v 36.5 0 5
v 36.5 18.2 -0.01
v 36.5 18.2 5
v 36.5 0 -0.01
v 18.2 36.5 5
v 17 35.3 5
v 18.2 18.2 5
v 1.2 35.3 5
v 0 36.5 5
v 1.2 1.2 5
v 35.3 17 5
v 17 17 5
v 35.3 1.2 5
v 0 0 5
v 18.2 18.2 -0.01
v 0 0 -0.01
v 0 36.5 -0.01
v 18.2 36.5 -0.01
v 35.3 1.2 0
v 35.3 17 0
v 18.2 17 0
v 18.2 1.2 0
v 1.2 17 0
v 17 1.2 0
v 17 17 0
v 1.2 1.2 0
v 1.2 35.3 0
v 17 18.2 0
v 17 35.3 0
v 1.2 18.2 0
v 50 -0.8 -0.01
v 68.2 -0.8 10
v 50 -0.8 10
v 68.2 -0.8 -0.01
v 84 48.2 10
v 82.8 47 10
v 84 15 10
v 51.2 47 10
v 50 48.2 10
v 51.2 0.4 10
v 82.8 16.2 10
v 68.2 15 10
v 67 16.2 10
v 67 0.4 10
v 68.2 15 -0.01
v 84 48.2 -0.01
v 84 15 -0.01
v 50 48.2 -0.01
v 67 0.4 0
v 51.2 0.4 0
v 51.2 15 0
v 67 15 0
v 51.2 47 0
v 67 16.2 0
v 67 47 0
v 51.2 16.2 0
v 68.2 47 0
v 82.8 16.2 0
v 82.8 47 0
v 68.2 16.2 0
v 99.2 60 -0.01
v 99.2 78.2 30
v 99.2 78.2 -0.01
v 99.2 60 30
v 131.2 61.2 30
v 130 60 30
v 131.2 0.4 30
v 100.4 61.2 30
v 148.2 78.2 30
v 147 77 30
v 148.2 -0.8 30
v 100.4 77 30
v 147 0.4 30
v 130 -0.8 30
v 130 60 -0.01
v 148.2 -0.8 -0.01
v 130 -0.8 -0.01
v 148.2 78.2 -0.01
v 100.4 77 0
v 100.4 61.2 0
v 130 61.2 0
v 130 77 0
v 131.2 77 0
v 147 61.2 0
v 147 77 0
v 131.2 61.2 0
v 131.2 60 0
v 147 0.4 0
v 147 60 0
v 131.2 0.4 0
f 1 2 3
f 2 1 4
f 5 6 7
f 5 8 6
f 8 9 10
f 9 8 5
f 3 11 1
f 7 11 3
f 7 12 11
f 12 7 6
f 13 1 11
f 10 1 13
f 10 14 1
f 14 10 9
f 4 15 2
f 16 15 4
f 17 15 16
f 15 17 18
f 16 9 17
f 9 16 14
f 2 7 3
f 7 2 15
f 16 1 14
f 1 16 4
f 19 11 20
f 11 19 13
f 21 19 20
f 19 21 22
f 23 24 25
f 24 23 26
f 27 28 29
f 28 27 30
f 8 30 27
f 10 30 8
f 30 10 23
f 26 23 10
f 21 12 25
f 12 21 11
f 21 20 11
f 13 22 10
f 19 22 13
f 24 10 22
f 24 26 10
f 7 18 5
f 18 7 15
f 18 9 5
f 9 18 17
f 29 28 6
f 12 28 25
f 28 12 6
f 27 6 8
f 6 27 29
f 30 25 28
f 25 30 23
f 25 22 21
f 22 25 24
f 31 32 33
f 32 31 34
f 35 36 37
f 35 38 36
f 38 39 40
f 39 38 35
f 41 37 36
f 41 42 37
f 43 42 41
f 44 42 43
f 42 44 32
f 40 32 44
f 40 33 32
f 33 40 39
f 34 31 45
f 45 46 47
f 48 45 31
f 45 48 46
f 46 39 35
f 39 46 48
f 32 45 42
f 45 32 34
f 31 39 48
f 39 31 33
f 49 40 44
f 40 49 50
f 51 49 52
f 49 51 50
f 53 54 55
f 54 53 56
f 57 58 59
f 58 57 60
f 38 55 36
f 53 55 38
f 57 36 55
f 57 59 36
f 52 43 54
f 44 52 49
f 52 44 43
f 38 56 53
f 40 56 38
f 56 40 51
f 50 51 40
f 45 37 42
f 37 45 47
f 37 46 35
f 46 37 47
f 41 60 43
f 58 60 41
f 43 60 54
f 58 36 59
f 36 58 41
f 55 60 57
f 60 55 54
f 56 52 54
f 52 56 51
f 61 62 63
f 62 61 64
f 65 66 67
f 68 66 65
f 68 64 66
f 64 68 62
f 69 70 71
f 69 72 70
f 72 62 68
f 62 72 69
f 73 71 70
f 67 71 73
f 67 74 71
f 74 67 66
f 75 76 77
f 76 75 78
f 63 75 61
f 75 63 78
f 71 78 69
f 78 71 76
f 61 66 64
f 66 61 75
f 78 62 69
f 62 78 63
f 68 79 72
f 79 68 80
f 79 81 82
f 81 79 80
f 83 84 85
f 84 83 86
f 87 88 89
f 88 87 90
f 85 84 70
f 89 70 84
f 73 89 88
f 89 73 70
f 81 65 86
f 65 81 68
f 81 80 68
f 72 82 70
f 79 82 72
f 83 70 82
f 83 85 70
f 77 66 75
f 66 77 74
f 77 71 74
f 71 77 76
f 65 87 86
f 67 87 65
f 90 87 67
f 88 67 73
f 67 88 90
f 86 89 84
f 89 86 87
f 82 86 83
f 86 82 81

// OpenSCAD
// file: ../../Base/Boxes.scad
// Fischertechnik Box Foundation
// Pre-designed Boxes

use <Constants.scad>

include <PlacementOptions.scad>

box190Width = 190;
box190Depth = 130;
box130Width = 130;
box130Depth = 95;
boxUsageHeight = 33.9;
boxWallThickness = 2.4;
boxBaseThickness = 1.0;

// getBoxWallThickness()
// Gets the wall thickness of a Fischertechnik Box

function getBoxWallThickness() = boxWallThickness;

// Gets the usable height of a fischertechnik box
function getBoxUsageHeight() = boxUsageHeight;

// Gets the thickness of the Fischertechnik box base.
function getBoxBaseThickness() = boxBaseThickness;

// Gets the usable inner space of a Box 190 as an x/y-list
function getBox190Space() = [
    box190Width - 2*getBoxWallThickness(), 
    box190Depth - 2*getBoxWallThickness() ];

// Imports the Fischertechnik empty box 130x190 mm and places it at position 0,0
// 190x130 are the outer sizes, the inner space is slightly smaller. Use getBox190Space() to get the inner sizes.
// This module needs the STL file "Fischertechnik Box 130x190.stl" in the library path.
// The box is positioned that the usable inner space is at the 0,0,0 position. The

module Box190() {
    translate([-getBoxWallThickness(),-getBoxWallThickness(),-getBoxBaseThickness()])
        import("Fischertechnik Box 130x190.stl", convexity=3);
}

// Gets the usable inner space of a Box 130 as an x/y-list
function getBox130Space() = [
    box130Width - 2*getBoxWallThickness(), 
    box130Depth - 2*getBoxWallThickness() ];

// Imports the Fischertechnik empty box 95x130 mm and places it at position 0,0
// 190x130 are the outer sizes, the inner space is slightly smaller. Use getBox190Space() to get the inner sizes.
// This module needs the STL file "Fischertechnik Box 95x130.stl" in the library path.
// The box is positioned that the usable inner space is at the 0,0,0 position. The

module Box130() {
    translate([-getBoxWallThickness(),-getBoxWallThickness(),-getBoxBaseThickness()])
        import("Fischertechnik Box 95x130.stl", convexity=3);
}

// Creates a web at the specified box walls
// corner 0 = LowerLeft, 1 = UpperLeft, 2 = UpperRight, 3 = LowerRight
// side 0 = LeftOfCorner, 1 = RightOfCorner
// distance = Distance in mm from the corner
// box = inner width and depth of the box (default: Box 190)
// webWidth = length of the web (default is 3 mms)
// webThickness = thickness of the web (default is 1 mm)

module BoxWeb(corner, side, distance, box=getBox190Space(), webWidth=3, webThickness=1.0) {
    sink = getBoxWallThickness()/2;

    width = (corner % 2 == 0) ? 
            (side == LeftOfCorner ? webWidth : webThickness) :
            (side == LeftOfCorner ? webThickness : webWidth);

    depth = (corner % 2 == 0) ? 
            (side == RightOfCorner ? webWidth : webThickness) :
            (side == RightOfCorner ? webThickness : webWidth);
    
    xDiff = corner == LowerLeft ? 
                (side == LeftOfCorner ? -sink : distance) :
            (corner == UpperLeft ?                
                (side == LeftOfCorner ? distance : -sink) :
            (corner == UpperRight ?
                (side == LeftOfCorner ? box.x-webWidth+sink : box.x-distance-webThickness) :
                (side == LeftOfCorner ? box.x-distance-webThickness: box.x-webWidth+sink)));

    yDiff = corner == LowerLeft ? 
                (side == RightOfCorner ? -sink : distance) :
            (corner == UpperLeft ?
                (side == RightOfCorner ? box.y-distance : box.y-webWidth+sink) :
            (corner == UpperRight ?
                (side == RightOfCorner ? box.y-webWidth+sink : box.y-distance) :
                (side == RightOfCorner ? distance : -sink)));
    
    translate([xDiff, yDiff, -getExcess()])
        cube([width, depth, boxUsageHeight + 2*getExcess()]);
}
// file: ../../Base/Rotation.scad
// Fischertechnik Box Foundation
// Geometry Helpers Rotation

include <PlacementOptions.scad>

// getRotatedSpace(space, rotation=NoRotation)
// Rotates the space dependent on the specified rotation

function getRotatedSpace(space, rotation=NoRotation) = [
    (rotation == Rotate90 || rotation == Rotate270) ? space.y : space.x,
    (rotation == Rotate90 || rotation == Rotate270) ? space.x : space.y
];

// Rotates the given space around the fixed left lower corner
// space = the space the children needs as width/depth list [width,depth]
// rotation = 0 Rotate0 degrees, 1 Rotate90 degrees, 2 Rotate180 degrees, 3 Rotate270 degrees (equivalent to -90)

module RotateFix(space, rotation=Rotate0) {
    dy = (rotation == Rotate0 || rotation == Rotate270) ? 0 :
        (rotation == Rotate90) ? space.x :
        space.y;
    dx = (rotation < Rotate180) ? 0 :
        (rotation == Rotate180) ? space.x :
        space.y;
    
    translate([dx, dy, 0])
        rotate([0, 0, rotations[rotation]])
            children();
}
// file: ../../Base/Alignment.scad
// Fischertechnik Box Foundation
// Geometry Helpers Alignment

include <PlacementOptions.scad>

// getAlignedX(elementWidth, spaceWidth, align=AlignRight, offset=0)
// Gets the aligned X offset of an element with the given
// width in the given space.
// elementWidth = The width of the element to positon
// spaceWidth = The space where the element should be aligned
// align = 0 AlignLeft, 1 AlignCenter, 2 AlignRight
// offset = an optional offset from the aligned position. When
// aligned left or centered, then positive values are in X direction.
// When aligned right then positive values are in negative X direction.

function getAlignedX(elementWidth, spaceWidth, align=AlignRight, offset=0) =
    (align == AlignLeft) ?
        offset :
        ((align == AlignCenter) ?
        (spaceWidth - elementWidth)/2 + offset :
        spaceWidth - offset - elementWidth);

// getAlignedY(elementDepth, spaceDepth, align=AlignTop, offset=0)
// Gets the aligned Y offset of an element with the given
// depth in the given space.
// elementDepth = The depth of the element to positon
// spaceDepth = The space where the element should be aligned
// align = 0 AlignBottom, 1 AlignCenter, 2 AlignTop
// offset = an optional offset from the aligned position. When
// aligned bottom or centered, then positive values are in Y direction.
// When aligned top then positive values are in negative Y direction.

function getAlignedY(elementDepth, spaceDepth, align=AlignTop, offset=0) =
    (align == AlignBottom) ?
        offset :
        ((align == AlignCenter) ?
        (spaceDepth - elementDepth)/2 + offset :
        spaceDepth - offset - elementDepth);
// file: ../../Base/Constants.scad
// Fischertechnik Box Foundation
// Constants

// Constant values necessary for multiple elements

// Base constants
dividerThickness = 1.2;
excess = 0.01;
fragments = 90;
tolerance = 0.8;

// Gets the thickness of a divider 
function getDividerThickness() = dividerThickness;

// Gets the excess that is used to merge walls into each other
function getExcess() = excess;

// Gets amount of fragments of a cylinder
function getFragments() = fragments;

// Gets the inner tolerance of a frame to each side
function getTolerance() = tolerance;


// Fischertechnik specific constants
axisDiameter = 4;
axisBottomDiameter = axisDiameter + 1;
standardEdgeDistance = 2.5;
standardWebDistance = 11.5;
standardCornerLength = 15;
tubeWallFactor = 1.6;

// Gets axis diameter
function getAxisDiameter() = axisDiameter;

// Gets axis bottom diameter for thicker part at the bottom
function getAxisBottomDiameter() = axisBottomDiameter;

// gets the standard distance to the wall of the box for dockable frames with webs
function getStandardEdgeDistance() = standardEdgeDistance;

// gets the standard distance of each web to the corner of the dockable frame
function getStandardWebDistance() = standardWebDistance;

// gets the standard length of the corner walls of a dockable frame
function getStandardCornerLength() = standardCornerLength;

// gets the wall thickness of a tube.
function getTubeWallThickness() = tubeWallFactor * getDividerThickness();
// file: ../../Base/PlacementOptions.scad
// Fischertechnik Box Foundation
// Placement Options

// Alignment
NoAlign = 0;
AlignLeft = 1;
AlignBottom = 2;
AlignCenter = 3;
AlignRight = 4;
AlignTop = 5;

// Element rotation degree steps
rotations = [0, -90, -180, -270];

// Rotation
NoRotation = 0;
Rotate0 = 0;
Rotate90 = 1;
Rotate180 = 2;
Rotate270 = 3;

// Docking (seen from above)
NoDock = -1;
DockLeft = 0;
DockTop = 1;
DockRight = 2;
DockCorner = 2;
DockBottom = 3;

// Web corners
LowerLeft = 0;
UpperLeft = 1;
UpperRight = 2;
LowerRight = 3;

// Web position relative to corner
LeftOfCorner = 0;
RightOfCorner = 1;
// file: ../../Base/Placement.scad
// Fischertechnik Box Foundation
// Geometry Helpers Placement

use <Constants.scad>
use <Alignment.scad>
use <Rotation.scad>
use <Boxes.scad>

include <PlacementOptions.scad>

// Place(x=0, y=0, elementSpace=[0,0], alignX=AlignLeft, alignY=AlignBottom, rotation=Rotate0, boxSpace=getBox190Space())
// Places the child at the specified position
// y = Y-Position. This is a relative position when an X aligment is specified.
// x = X-Position. This is a relative position when an Y aligment is specified.
// elementSpace = space of the element to be placed [x,y]
// alignX = -1=NoAlign, 0 AlignLeft, 1 AlignCenter, 3 AlignRight (elementSpace and boxSpace required!)
// alignY = -1=NoAlign, 2 AlignBottom, 1 AlignCenter, 4 AlignTop (elementSpace and boxSpace required!)
// rotation = 0 Rotate0 0 degrees, 1 Rotate90 90 degrees, 
// 2 Rotate180 180 degrees, 3 Rotate270 270 degrees (equivalent to -90)
// boxSpace = Inner space of the box where the placement occurs [x,y] - default is Box 190x130 inner space

module Place(x=0, y=0, elementSpace=[0,0], 
  alignX=AlignLeft, alignY=AlignBottom, 
  rotation=NoRotation, boxSpace=getBox190Space()) {

    module Position(x, y, space, rotation=Rotate0) {
        translate([x, y, 0])
            RotateFix(space, rotation)
                children(0);
    }

    space = getRotatedSpace(elementSpace, rotation);
    alignedX = getAlignedX(space.x, boxSpace.x, alignX, x);
    alignedY = getAlignedY(space.y, boxSpace.y, alignY, y);
    Position(alignedX, alignedY, elementSpace, rotation)
        children(0);
}

// Center(space=getBox130Space(), elementSpace=[0,0])
// space = Space where the children is centered. For cylinder use centered=true and no elementSpace.
// elementSpace = space of the element to be centered [x,y]

module Center(space=getBox190Space(), elementSpace=[0,0]) {
    translate([(space.x - elementSpace.x) / 2, (space.y - elementSpace.y) / 2])
        children(0);
}

// CenterHorizontal(width=0, y=0, offset=0, space=getBox130Space())
// space = Space where the children is centered. For cylinder use centered=true and no elementSpace.
// elementSpace = space of the element to be centered [x,y]

module CenterHorizontal(width=0, y=0, offset=0, space=getBox190Space()) {
    translate([(space.x - width) / 2 + offset, y])
        children(0);
}

// CenterVertical(depth=0, x=0, offset=0, space=getBox130Space())
// space = Space where the children is centered. For cylinder use centered=true and no elementSpace.
// elementSpace = space of the element to be centered [x,y]

module CenterVerticalal(depth=0, x=0, offset=0, space=getBox190Space()) {
    translate([x, (space.y - depth) / 2 + offset])
        children(0);
}
// main file
// Fischertechnik Box Foundation
// ModelBase
// Test AngledFrame

use <../../Base/Placement.scad>
use <../../ModelBase/Simple.scad>

include <../../Base/PlacementOptions.scad>

AngledFrame(32.5, 15, 32.5, 15, 5);

Place(50, 0, getAngledFrameOuterVolume(45, 15, 30, 30, 10), rotation=Rotate90)
    AngledFrame(45, 15, 30, 30, 10);

Place(100, 0, getAngledFrameOuterVolume(45, 15, 75, 15, 10), rotation=Rotate180)
    AngledFrame(45, 15, 75, 15, 30);
